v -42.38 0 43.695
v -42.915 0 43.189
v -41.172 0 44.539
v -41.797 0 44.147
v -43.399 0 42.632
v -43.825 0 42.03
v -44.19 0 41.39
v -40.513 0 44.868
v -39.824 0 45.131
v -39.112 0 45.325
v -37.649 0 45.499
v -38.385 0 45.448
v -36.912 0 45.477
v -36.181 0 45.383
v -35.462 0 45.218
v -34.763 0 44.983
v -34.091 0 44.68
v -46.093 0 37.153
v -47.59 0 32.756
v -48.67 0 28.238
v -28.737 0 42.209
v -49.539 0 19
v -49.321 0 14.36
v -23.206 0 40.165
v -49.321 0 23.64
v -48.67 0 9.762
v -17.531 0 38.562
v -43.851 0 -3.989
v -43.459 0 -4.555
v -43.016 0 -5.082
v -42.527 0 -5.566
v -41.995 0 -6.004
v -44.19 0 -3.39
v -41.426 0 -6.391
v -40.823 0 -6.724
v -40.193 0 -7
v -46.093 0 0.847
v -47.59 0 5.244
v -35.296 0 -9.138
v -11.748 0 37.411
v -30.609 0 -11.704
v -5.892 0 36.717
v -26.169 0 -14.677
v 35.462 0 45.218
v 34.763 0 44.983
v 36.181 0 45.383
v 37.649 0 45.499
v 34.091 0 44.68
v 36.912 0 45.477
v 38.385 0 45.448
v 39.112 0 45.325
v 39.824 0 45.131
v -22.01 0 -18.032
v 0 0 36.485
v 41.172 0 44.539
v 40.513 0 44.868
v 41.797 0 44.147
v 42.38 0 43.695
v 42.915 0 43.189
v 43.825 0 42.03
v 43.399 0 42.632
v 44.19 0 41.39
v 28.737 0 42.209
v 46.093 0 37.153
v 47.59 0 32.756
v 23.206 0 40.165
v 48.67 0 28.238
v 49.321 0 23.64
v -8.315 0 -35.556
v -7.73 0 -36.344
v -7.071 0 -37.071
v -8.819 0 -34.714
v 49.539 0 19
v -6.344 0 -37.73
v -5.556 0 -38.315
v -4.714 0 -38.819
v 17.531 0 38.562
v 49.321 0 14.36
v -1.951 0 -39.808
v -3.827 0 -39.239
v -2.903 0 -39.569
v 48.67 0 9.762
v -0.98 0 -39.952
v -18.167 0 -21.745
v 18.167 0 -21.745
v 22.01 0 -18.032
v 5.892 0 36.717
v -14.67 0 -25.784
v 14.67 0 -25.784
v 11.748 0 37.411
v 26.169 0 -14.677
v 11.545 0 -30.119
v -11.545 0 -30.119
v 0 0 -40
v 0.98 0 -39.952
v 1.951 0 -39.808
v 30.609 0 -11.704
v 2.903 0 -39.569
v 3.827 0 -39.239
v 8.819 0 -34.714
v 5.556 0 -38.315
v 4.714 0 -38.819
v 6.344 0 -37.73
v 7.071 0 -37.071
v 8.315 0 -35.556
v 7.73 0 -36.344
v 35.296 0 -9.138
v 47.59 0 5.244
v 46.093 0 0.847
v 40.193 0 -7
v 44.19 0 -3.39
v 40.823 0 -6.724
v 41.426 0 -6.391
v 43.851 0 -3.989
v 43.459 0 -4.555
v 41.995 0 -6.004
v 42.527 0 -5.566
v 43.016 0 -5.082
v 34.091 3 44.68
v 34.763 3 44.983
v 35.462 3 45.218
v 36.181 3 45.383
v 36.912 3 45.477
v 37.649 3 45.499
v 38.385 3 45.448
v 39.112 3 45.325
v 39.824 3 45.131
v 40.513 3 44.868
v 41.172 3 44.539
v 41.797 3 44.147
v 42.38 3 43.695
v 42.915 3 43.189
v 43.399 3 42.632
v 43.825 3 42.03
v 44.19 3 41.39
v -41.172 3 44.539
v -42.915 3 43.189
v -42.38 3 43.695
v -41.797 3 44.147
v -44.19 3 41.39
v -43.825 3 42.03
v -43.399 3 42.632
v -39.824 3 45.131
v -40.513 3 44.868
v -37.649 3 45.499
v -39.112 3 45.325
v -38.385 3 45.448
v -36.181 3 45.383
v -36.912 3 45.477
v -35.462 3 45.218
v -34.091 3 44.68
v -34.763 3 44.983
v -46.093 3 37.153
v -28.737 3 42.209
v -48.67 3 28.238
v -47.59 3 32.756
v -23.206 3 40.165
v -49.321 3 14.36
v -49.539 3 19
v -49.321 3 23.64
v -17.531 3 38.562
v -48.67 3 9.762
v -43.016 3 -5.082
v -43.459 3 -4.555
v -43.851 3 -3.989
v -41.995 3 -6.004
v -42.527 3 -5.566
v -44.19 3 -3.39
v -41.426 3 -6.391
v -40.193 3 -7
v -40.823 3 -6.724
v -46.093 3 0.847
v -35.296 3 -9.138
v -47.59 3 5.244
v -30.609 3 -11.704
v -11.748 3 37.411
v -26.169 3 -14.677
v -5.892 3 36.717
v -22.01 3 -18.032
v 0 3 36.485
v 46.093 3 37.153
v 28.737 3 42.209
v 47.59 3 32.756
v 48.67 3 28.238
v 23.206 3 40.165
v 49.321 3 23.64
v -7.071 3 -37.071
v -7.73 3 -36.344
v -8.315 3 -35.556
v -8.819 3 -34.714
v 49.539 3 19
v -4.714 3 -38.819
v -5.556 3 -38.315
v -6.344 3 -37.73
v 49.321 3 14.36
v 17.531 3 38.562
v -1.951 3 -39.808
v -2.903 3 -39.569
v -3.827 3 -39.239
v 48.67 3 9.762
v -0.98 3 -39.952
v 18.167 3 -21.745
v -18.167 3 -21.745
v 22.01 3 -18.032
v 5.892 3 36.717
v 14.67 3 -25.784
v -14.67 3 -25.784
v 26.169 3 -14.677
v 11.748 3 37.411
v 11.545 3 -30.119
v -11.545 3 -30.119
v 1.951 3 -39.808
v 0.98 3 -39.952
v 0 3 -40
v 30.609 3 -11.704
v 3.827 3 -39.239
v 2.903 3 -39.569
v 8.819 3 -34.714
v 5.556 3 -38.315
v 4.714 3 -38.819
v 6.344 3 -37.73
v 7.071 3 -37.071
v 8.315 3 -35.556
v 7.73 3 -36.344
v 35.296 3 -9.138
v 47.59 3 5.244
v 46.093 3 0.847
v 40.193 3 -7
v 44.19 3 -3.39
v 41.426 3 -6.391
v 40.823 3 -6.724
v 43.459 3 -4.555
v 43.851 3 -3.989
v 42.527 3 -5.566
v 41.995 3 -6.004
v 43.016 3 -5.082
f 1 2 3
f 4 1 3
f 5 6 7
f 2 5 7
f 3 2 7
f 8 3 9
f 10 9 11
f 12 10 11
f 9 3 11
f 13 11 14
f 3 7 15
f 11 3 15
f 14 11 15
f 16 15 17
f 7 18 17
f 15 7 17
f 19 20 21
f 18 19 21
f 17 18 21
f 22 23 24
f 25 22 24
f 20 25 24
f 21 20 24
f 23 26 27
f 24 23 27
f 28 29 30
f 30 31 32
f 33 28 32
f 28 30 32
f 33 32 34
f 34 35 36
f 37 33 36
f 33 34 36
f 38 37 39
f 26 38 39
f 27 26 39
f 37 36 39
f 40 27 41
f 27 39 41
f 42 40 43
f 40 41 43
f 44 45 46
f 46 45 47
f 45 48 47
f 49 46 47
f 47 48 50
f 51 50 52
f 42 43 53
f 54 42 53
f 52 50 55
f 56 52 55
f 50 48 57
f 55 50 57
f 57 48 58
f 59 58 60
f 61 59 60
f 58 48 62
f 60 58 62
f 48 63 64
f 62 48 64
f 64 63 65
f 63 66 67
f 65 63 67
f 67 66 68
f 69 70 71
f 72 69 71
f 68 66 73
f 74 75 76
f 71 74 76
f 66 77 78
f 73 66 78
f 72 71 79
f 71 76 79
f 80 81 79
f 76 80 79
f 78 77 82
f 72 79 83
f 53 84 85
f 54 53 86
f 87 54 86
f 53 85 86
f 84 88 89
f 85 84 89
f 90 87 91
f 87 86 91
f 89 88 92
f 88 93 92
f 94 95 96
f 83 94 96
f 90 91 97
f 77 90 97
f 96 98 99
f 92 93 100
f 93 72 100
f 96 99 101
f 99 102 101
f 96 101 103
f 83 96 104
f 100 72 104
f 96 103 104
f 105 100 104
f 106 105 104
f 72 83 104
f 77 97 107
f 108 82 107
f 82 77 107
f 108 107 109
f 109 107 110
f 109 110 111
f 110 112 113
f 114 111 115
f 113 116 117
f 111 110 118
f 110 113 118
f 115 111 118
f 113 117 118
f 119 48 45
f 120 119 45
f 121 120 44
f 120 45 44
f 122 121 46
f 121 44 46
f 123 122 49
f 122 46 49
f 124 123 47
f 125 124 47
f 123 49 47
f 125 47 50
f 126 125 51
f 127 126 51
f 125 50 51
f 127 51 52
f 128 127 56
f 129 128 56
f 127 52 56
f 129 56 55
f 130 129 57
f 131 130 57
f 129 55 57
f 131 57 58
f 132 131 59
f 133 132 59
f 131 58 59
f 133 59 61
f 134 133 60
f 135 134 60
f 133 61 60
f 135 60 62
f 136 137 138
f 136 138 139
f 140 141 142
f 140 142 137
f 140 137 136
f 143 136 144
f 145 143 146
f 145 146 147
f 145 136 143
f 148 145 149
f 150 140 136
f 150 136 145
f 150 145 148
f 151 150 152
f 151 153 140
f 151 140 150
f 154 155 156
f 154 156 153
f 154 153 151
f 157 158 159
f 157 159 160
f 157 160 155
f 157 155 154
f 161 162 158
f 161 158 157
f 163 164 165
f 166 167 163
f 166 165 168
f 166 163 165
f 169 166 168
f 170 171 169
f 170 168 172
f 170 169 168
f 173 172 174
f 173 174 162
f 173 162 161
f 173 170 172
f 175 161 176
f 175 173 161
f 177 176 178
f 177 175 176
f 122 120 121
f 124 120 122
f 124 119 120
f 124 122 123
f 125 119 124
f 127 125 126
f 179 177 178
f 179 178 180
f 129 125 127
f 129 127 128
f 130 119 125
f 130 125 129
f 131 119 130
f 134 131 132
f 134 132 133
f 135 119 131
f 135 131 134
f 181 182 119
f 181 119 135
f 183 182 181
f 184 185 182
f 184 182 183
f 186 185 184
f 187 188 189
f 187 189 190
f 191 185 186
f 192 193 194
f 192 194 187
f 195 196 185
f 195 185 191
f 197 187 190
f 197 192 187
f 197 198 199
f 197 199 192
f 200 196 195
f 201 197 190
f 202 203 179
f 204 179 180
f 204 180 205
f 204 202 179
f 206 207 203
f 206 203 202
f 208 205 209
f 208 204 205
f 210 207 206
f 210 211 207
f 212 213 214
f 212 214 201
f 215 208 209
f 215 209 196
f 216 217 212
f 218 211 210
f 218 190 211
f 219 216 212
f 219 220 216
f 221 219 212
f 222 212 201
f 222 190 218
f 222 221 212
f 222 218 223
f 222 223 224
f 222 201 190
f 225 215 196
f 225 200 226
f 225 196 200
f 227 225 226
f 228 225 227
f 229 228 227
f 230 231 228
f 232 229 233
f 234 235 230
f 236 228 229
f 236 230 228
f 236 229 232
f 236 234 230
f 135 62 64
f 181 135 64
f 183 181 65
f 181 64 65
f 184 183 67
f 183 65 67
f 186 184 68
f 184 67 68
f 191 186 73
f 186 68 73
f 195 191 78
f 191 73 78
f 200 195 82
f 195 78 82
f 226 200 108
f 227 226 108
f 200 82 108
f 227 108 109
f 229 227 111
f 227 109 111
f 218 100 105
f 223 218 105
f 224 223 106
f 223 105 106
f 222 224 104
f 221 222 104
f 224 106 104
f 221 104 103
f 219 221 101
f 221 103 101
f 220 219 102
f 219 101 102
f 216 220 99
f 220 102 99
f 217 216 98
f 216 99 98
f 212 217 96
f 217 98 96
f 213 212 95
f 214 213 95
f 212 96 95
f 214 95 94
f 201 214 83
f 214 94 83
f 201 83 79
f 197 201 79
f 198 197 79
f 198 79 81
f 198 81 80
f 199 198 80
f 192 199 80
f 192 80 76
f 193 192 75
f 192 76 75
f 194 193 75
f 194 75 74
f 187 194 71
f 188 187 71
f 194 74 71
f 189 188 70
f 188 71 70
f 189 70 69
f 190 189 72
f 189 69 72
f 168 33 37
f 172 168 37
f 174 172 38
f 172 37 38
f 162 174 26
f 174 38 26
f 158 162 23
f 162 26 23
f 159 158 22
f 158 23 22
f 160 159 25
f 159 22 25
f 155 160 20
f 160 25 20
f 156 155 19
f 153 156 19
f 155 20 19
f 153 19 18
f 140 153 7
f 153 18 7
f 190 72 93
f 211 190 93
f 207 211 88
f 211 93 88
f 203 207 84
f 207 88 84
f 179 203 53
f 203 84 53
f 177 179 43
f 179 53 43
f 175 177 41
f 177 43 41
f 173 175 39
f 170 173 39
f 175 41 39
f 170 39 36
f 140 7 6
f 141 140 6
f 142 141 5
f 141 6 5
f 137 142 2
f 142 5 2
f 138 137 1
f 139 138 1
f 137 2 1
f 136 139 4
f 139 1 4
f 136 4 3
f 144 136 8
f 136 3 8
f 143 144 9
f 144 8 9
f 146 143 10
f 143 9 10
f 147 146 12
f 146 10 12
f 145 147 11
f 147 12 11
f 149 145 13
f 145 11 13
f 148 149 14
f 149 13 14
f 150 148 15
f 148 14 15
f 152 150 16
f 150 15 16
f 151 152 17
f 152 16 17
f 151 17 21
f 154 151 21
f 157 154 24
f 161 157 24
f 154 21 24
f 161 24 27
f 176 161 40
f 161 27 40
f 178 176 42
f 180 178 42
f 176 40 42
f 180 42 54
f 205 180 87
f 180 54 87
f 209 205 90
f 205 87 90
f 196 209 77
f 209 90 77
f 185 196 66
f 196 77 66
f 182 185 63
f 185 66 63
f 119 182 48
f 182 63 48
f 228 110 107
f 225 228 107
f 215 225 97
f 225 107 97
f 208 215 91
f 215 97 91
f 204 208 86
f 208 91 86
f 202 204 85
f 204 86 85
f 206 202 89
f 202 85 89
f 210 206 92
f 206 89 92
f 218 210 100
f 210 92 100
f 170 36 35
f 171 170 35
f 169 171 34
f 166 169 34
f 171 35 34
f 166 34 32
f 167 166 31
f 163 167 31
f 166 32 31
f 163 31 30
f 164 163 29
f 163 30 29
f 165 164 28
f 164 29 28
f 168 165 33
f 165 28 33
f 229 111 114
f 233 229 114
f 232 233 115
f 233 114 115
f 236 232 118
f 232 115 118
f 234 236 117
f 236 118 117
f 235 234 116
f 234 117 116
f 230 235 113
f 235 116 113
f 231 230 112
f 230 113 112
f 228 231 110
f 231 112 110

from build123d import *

# Parameters (mm, degrees)
BOSS_EXTRUDE1_DEPTH = 3


with BuildPart() as part:
    # Sketch1 → Boss-Extrude1 (new body)
    with BuildSketch(Plane(origin=(0, 0, 0), x_dir=(1, 0, 0), z_dir=(0, 1, 0))):
        with BuildLine():
            ThreePointArc((-44.190268387, -41.389735818), (-39.823508359, -45.131010371), (-34.090908396, -44.680426216))
            ThreePointArc((-34.090908396, -44.680426216), (-7.1e-08, -36.484692283), (34.090908269, -44.680426152))
            ThreePointArc((34.090908269, -44.680426152), (39.823508354, -45.131010372), (44.190268446, -41.389735701))
            ThreePointArc((44.190268446, -41.389735701), (49.538672672, -18.999999828), (44.19026829, 3.389736008))
            ThreePointArc((44.19026829, 3.389736008), (42.526729152, 5.566147144), (40.192590574, 6.999996857))
            ThreePointArc((40.192590574, 6.999996857), (22.010436955, 18.032282207), (8.819043592, 34.714283628))
            ThreePointArc((8.819043592, 34.714283628), (7.4e-08, 40), (-8.819043522, 34.714283759))
            ThreePointArc((-8.819043522, 34.714283759), (-22.010436745, 18.032282393), (-40.19259019, 6.999997005))
            ThreePointArc((-40.19259019, 6.999997005), (-42.526728969, 5.566147309), (-44.190268254, 3.389736081))
            ThreePointArc((-44.190268254, 3.389736081), (-49.538672672, -18.999999853), (-44.190268387, -41.389735818))
        make_face()
    extrude(amount=BOSS_EXTRUDE1_DEPTH)


solid = part.part
